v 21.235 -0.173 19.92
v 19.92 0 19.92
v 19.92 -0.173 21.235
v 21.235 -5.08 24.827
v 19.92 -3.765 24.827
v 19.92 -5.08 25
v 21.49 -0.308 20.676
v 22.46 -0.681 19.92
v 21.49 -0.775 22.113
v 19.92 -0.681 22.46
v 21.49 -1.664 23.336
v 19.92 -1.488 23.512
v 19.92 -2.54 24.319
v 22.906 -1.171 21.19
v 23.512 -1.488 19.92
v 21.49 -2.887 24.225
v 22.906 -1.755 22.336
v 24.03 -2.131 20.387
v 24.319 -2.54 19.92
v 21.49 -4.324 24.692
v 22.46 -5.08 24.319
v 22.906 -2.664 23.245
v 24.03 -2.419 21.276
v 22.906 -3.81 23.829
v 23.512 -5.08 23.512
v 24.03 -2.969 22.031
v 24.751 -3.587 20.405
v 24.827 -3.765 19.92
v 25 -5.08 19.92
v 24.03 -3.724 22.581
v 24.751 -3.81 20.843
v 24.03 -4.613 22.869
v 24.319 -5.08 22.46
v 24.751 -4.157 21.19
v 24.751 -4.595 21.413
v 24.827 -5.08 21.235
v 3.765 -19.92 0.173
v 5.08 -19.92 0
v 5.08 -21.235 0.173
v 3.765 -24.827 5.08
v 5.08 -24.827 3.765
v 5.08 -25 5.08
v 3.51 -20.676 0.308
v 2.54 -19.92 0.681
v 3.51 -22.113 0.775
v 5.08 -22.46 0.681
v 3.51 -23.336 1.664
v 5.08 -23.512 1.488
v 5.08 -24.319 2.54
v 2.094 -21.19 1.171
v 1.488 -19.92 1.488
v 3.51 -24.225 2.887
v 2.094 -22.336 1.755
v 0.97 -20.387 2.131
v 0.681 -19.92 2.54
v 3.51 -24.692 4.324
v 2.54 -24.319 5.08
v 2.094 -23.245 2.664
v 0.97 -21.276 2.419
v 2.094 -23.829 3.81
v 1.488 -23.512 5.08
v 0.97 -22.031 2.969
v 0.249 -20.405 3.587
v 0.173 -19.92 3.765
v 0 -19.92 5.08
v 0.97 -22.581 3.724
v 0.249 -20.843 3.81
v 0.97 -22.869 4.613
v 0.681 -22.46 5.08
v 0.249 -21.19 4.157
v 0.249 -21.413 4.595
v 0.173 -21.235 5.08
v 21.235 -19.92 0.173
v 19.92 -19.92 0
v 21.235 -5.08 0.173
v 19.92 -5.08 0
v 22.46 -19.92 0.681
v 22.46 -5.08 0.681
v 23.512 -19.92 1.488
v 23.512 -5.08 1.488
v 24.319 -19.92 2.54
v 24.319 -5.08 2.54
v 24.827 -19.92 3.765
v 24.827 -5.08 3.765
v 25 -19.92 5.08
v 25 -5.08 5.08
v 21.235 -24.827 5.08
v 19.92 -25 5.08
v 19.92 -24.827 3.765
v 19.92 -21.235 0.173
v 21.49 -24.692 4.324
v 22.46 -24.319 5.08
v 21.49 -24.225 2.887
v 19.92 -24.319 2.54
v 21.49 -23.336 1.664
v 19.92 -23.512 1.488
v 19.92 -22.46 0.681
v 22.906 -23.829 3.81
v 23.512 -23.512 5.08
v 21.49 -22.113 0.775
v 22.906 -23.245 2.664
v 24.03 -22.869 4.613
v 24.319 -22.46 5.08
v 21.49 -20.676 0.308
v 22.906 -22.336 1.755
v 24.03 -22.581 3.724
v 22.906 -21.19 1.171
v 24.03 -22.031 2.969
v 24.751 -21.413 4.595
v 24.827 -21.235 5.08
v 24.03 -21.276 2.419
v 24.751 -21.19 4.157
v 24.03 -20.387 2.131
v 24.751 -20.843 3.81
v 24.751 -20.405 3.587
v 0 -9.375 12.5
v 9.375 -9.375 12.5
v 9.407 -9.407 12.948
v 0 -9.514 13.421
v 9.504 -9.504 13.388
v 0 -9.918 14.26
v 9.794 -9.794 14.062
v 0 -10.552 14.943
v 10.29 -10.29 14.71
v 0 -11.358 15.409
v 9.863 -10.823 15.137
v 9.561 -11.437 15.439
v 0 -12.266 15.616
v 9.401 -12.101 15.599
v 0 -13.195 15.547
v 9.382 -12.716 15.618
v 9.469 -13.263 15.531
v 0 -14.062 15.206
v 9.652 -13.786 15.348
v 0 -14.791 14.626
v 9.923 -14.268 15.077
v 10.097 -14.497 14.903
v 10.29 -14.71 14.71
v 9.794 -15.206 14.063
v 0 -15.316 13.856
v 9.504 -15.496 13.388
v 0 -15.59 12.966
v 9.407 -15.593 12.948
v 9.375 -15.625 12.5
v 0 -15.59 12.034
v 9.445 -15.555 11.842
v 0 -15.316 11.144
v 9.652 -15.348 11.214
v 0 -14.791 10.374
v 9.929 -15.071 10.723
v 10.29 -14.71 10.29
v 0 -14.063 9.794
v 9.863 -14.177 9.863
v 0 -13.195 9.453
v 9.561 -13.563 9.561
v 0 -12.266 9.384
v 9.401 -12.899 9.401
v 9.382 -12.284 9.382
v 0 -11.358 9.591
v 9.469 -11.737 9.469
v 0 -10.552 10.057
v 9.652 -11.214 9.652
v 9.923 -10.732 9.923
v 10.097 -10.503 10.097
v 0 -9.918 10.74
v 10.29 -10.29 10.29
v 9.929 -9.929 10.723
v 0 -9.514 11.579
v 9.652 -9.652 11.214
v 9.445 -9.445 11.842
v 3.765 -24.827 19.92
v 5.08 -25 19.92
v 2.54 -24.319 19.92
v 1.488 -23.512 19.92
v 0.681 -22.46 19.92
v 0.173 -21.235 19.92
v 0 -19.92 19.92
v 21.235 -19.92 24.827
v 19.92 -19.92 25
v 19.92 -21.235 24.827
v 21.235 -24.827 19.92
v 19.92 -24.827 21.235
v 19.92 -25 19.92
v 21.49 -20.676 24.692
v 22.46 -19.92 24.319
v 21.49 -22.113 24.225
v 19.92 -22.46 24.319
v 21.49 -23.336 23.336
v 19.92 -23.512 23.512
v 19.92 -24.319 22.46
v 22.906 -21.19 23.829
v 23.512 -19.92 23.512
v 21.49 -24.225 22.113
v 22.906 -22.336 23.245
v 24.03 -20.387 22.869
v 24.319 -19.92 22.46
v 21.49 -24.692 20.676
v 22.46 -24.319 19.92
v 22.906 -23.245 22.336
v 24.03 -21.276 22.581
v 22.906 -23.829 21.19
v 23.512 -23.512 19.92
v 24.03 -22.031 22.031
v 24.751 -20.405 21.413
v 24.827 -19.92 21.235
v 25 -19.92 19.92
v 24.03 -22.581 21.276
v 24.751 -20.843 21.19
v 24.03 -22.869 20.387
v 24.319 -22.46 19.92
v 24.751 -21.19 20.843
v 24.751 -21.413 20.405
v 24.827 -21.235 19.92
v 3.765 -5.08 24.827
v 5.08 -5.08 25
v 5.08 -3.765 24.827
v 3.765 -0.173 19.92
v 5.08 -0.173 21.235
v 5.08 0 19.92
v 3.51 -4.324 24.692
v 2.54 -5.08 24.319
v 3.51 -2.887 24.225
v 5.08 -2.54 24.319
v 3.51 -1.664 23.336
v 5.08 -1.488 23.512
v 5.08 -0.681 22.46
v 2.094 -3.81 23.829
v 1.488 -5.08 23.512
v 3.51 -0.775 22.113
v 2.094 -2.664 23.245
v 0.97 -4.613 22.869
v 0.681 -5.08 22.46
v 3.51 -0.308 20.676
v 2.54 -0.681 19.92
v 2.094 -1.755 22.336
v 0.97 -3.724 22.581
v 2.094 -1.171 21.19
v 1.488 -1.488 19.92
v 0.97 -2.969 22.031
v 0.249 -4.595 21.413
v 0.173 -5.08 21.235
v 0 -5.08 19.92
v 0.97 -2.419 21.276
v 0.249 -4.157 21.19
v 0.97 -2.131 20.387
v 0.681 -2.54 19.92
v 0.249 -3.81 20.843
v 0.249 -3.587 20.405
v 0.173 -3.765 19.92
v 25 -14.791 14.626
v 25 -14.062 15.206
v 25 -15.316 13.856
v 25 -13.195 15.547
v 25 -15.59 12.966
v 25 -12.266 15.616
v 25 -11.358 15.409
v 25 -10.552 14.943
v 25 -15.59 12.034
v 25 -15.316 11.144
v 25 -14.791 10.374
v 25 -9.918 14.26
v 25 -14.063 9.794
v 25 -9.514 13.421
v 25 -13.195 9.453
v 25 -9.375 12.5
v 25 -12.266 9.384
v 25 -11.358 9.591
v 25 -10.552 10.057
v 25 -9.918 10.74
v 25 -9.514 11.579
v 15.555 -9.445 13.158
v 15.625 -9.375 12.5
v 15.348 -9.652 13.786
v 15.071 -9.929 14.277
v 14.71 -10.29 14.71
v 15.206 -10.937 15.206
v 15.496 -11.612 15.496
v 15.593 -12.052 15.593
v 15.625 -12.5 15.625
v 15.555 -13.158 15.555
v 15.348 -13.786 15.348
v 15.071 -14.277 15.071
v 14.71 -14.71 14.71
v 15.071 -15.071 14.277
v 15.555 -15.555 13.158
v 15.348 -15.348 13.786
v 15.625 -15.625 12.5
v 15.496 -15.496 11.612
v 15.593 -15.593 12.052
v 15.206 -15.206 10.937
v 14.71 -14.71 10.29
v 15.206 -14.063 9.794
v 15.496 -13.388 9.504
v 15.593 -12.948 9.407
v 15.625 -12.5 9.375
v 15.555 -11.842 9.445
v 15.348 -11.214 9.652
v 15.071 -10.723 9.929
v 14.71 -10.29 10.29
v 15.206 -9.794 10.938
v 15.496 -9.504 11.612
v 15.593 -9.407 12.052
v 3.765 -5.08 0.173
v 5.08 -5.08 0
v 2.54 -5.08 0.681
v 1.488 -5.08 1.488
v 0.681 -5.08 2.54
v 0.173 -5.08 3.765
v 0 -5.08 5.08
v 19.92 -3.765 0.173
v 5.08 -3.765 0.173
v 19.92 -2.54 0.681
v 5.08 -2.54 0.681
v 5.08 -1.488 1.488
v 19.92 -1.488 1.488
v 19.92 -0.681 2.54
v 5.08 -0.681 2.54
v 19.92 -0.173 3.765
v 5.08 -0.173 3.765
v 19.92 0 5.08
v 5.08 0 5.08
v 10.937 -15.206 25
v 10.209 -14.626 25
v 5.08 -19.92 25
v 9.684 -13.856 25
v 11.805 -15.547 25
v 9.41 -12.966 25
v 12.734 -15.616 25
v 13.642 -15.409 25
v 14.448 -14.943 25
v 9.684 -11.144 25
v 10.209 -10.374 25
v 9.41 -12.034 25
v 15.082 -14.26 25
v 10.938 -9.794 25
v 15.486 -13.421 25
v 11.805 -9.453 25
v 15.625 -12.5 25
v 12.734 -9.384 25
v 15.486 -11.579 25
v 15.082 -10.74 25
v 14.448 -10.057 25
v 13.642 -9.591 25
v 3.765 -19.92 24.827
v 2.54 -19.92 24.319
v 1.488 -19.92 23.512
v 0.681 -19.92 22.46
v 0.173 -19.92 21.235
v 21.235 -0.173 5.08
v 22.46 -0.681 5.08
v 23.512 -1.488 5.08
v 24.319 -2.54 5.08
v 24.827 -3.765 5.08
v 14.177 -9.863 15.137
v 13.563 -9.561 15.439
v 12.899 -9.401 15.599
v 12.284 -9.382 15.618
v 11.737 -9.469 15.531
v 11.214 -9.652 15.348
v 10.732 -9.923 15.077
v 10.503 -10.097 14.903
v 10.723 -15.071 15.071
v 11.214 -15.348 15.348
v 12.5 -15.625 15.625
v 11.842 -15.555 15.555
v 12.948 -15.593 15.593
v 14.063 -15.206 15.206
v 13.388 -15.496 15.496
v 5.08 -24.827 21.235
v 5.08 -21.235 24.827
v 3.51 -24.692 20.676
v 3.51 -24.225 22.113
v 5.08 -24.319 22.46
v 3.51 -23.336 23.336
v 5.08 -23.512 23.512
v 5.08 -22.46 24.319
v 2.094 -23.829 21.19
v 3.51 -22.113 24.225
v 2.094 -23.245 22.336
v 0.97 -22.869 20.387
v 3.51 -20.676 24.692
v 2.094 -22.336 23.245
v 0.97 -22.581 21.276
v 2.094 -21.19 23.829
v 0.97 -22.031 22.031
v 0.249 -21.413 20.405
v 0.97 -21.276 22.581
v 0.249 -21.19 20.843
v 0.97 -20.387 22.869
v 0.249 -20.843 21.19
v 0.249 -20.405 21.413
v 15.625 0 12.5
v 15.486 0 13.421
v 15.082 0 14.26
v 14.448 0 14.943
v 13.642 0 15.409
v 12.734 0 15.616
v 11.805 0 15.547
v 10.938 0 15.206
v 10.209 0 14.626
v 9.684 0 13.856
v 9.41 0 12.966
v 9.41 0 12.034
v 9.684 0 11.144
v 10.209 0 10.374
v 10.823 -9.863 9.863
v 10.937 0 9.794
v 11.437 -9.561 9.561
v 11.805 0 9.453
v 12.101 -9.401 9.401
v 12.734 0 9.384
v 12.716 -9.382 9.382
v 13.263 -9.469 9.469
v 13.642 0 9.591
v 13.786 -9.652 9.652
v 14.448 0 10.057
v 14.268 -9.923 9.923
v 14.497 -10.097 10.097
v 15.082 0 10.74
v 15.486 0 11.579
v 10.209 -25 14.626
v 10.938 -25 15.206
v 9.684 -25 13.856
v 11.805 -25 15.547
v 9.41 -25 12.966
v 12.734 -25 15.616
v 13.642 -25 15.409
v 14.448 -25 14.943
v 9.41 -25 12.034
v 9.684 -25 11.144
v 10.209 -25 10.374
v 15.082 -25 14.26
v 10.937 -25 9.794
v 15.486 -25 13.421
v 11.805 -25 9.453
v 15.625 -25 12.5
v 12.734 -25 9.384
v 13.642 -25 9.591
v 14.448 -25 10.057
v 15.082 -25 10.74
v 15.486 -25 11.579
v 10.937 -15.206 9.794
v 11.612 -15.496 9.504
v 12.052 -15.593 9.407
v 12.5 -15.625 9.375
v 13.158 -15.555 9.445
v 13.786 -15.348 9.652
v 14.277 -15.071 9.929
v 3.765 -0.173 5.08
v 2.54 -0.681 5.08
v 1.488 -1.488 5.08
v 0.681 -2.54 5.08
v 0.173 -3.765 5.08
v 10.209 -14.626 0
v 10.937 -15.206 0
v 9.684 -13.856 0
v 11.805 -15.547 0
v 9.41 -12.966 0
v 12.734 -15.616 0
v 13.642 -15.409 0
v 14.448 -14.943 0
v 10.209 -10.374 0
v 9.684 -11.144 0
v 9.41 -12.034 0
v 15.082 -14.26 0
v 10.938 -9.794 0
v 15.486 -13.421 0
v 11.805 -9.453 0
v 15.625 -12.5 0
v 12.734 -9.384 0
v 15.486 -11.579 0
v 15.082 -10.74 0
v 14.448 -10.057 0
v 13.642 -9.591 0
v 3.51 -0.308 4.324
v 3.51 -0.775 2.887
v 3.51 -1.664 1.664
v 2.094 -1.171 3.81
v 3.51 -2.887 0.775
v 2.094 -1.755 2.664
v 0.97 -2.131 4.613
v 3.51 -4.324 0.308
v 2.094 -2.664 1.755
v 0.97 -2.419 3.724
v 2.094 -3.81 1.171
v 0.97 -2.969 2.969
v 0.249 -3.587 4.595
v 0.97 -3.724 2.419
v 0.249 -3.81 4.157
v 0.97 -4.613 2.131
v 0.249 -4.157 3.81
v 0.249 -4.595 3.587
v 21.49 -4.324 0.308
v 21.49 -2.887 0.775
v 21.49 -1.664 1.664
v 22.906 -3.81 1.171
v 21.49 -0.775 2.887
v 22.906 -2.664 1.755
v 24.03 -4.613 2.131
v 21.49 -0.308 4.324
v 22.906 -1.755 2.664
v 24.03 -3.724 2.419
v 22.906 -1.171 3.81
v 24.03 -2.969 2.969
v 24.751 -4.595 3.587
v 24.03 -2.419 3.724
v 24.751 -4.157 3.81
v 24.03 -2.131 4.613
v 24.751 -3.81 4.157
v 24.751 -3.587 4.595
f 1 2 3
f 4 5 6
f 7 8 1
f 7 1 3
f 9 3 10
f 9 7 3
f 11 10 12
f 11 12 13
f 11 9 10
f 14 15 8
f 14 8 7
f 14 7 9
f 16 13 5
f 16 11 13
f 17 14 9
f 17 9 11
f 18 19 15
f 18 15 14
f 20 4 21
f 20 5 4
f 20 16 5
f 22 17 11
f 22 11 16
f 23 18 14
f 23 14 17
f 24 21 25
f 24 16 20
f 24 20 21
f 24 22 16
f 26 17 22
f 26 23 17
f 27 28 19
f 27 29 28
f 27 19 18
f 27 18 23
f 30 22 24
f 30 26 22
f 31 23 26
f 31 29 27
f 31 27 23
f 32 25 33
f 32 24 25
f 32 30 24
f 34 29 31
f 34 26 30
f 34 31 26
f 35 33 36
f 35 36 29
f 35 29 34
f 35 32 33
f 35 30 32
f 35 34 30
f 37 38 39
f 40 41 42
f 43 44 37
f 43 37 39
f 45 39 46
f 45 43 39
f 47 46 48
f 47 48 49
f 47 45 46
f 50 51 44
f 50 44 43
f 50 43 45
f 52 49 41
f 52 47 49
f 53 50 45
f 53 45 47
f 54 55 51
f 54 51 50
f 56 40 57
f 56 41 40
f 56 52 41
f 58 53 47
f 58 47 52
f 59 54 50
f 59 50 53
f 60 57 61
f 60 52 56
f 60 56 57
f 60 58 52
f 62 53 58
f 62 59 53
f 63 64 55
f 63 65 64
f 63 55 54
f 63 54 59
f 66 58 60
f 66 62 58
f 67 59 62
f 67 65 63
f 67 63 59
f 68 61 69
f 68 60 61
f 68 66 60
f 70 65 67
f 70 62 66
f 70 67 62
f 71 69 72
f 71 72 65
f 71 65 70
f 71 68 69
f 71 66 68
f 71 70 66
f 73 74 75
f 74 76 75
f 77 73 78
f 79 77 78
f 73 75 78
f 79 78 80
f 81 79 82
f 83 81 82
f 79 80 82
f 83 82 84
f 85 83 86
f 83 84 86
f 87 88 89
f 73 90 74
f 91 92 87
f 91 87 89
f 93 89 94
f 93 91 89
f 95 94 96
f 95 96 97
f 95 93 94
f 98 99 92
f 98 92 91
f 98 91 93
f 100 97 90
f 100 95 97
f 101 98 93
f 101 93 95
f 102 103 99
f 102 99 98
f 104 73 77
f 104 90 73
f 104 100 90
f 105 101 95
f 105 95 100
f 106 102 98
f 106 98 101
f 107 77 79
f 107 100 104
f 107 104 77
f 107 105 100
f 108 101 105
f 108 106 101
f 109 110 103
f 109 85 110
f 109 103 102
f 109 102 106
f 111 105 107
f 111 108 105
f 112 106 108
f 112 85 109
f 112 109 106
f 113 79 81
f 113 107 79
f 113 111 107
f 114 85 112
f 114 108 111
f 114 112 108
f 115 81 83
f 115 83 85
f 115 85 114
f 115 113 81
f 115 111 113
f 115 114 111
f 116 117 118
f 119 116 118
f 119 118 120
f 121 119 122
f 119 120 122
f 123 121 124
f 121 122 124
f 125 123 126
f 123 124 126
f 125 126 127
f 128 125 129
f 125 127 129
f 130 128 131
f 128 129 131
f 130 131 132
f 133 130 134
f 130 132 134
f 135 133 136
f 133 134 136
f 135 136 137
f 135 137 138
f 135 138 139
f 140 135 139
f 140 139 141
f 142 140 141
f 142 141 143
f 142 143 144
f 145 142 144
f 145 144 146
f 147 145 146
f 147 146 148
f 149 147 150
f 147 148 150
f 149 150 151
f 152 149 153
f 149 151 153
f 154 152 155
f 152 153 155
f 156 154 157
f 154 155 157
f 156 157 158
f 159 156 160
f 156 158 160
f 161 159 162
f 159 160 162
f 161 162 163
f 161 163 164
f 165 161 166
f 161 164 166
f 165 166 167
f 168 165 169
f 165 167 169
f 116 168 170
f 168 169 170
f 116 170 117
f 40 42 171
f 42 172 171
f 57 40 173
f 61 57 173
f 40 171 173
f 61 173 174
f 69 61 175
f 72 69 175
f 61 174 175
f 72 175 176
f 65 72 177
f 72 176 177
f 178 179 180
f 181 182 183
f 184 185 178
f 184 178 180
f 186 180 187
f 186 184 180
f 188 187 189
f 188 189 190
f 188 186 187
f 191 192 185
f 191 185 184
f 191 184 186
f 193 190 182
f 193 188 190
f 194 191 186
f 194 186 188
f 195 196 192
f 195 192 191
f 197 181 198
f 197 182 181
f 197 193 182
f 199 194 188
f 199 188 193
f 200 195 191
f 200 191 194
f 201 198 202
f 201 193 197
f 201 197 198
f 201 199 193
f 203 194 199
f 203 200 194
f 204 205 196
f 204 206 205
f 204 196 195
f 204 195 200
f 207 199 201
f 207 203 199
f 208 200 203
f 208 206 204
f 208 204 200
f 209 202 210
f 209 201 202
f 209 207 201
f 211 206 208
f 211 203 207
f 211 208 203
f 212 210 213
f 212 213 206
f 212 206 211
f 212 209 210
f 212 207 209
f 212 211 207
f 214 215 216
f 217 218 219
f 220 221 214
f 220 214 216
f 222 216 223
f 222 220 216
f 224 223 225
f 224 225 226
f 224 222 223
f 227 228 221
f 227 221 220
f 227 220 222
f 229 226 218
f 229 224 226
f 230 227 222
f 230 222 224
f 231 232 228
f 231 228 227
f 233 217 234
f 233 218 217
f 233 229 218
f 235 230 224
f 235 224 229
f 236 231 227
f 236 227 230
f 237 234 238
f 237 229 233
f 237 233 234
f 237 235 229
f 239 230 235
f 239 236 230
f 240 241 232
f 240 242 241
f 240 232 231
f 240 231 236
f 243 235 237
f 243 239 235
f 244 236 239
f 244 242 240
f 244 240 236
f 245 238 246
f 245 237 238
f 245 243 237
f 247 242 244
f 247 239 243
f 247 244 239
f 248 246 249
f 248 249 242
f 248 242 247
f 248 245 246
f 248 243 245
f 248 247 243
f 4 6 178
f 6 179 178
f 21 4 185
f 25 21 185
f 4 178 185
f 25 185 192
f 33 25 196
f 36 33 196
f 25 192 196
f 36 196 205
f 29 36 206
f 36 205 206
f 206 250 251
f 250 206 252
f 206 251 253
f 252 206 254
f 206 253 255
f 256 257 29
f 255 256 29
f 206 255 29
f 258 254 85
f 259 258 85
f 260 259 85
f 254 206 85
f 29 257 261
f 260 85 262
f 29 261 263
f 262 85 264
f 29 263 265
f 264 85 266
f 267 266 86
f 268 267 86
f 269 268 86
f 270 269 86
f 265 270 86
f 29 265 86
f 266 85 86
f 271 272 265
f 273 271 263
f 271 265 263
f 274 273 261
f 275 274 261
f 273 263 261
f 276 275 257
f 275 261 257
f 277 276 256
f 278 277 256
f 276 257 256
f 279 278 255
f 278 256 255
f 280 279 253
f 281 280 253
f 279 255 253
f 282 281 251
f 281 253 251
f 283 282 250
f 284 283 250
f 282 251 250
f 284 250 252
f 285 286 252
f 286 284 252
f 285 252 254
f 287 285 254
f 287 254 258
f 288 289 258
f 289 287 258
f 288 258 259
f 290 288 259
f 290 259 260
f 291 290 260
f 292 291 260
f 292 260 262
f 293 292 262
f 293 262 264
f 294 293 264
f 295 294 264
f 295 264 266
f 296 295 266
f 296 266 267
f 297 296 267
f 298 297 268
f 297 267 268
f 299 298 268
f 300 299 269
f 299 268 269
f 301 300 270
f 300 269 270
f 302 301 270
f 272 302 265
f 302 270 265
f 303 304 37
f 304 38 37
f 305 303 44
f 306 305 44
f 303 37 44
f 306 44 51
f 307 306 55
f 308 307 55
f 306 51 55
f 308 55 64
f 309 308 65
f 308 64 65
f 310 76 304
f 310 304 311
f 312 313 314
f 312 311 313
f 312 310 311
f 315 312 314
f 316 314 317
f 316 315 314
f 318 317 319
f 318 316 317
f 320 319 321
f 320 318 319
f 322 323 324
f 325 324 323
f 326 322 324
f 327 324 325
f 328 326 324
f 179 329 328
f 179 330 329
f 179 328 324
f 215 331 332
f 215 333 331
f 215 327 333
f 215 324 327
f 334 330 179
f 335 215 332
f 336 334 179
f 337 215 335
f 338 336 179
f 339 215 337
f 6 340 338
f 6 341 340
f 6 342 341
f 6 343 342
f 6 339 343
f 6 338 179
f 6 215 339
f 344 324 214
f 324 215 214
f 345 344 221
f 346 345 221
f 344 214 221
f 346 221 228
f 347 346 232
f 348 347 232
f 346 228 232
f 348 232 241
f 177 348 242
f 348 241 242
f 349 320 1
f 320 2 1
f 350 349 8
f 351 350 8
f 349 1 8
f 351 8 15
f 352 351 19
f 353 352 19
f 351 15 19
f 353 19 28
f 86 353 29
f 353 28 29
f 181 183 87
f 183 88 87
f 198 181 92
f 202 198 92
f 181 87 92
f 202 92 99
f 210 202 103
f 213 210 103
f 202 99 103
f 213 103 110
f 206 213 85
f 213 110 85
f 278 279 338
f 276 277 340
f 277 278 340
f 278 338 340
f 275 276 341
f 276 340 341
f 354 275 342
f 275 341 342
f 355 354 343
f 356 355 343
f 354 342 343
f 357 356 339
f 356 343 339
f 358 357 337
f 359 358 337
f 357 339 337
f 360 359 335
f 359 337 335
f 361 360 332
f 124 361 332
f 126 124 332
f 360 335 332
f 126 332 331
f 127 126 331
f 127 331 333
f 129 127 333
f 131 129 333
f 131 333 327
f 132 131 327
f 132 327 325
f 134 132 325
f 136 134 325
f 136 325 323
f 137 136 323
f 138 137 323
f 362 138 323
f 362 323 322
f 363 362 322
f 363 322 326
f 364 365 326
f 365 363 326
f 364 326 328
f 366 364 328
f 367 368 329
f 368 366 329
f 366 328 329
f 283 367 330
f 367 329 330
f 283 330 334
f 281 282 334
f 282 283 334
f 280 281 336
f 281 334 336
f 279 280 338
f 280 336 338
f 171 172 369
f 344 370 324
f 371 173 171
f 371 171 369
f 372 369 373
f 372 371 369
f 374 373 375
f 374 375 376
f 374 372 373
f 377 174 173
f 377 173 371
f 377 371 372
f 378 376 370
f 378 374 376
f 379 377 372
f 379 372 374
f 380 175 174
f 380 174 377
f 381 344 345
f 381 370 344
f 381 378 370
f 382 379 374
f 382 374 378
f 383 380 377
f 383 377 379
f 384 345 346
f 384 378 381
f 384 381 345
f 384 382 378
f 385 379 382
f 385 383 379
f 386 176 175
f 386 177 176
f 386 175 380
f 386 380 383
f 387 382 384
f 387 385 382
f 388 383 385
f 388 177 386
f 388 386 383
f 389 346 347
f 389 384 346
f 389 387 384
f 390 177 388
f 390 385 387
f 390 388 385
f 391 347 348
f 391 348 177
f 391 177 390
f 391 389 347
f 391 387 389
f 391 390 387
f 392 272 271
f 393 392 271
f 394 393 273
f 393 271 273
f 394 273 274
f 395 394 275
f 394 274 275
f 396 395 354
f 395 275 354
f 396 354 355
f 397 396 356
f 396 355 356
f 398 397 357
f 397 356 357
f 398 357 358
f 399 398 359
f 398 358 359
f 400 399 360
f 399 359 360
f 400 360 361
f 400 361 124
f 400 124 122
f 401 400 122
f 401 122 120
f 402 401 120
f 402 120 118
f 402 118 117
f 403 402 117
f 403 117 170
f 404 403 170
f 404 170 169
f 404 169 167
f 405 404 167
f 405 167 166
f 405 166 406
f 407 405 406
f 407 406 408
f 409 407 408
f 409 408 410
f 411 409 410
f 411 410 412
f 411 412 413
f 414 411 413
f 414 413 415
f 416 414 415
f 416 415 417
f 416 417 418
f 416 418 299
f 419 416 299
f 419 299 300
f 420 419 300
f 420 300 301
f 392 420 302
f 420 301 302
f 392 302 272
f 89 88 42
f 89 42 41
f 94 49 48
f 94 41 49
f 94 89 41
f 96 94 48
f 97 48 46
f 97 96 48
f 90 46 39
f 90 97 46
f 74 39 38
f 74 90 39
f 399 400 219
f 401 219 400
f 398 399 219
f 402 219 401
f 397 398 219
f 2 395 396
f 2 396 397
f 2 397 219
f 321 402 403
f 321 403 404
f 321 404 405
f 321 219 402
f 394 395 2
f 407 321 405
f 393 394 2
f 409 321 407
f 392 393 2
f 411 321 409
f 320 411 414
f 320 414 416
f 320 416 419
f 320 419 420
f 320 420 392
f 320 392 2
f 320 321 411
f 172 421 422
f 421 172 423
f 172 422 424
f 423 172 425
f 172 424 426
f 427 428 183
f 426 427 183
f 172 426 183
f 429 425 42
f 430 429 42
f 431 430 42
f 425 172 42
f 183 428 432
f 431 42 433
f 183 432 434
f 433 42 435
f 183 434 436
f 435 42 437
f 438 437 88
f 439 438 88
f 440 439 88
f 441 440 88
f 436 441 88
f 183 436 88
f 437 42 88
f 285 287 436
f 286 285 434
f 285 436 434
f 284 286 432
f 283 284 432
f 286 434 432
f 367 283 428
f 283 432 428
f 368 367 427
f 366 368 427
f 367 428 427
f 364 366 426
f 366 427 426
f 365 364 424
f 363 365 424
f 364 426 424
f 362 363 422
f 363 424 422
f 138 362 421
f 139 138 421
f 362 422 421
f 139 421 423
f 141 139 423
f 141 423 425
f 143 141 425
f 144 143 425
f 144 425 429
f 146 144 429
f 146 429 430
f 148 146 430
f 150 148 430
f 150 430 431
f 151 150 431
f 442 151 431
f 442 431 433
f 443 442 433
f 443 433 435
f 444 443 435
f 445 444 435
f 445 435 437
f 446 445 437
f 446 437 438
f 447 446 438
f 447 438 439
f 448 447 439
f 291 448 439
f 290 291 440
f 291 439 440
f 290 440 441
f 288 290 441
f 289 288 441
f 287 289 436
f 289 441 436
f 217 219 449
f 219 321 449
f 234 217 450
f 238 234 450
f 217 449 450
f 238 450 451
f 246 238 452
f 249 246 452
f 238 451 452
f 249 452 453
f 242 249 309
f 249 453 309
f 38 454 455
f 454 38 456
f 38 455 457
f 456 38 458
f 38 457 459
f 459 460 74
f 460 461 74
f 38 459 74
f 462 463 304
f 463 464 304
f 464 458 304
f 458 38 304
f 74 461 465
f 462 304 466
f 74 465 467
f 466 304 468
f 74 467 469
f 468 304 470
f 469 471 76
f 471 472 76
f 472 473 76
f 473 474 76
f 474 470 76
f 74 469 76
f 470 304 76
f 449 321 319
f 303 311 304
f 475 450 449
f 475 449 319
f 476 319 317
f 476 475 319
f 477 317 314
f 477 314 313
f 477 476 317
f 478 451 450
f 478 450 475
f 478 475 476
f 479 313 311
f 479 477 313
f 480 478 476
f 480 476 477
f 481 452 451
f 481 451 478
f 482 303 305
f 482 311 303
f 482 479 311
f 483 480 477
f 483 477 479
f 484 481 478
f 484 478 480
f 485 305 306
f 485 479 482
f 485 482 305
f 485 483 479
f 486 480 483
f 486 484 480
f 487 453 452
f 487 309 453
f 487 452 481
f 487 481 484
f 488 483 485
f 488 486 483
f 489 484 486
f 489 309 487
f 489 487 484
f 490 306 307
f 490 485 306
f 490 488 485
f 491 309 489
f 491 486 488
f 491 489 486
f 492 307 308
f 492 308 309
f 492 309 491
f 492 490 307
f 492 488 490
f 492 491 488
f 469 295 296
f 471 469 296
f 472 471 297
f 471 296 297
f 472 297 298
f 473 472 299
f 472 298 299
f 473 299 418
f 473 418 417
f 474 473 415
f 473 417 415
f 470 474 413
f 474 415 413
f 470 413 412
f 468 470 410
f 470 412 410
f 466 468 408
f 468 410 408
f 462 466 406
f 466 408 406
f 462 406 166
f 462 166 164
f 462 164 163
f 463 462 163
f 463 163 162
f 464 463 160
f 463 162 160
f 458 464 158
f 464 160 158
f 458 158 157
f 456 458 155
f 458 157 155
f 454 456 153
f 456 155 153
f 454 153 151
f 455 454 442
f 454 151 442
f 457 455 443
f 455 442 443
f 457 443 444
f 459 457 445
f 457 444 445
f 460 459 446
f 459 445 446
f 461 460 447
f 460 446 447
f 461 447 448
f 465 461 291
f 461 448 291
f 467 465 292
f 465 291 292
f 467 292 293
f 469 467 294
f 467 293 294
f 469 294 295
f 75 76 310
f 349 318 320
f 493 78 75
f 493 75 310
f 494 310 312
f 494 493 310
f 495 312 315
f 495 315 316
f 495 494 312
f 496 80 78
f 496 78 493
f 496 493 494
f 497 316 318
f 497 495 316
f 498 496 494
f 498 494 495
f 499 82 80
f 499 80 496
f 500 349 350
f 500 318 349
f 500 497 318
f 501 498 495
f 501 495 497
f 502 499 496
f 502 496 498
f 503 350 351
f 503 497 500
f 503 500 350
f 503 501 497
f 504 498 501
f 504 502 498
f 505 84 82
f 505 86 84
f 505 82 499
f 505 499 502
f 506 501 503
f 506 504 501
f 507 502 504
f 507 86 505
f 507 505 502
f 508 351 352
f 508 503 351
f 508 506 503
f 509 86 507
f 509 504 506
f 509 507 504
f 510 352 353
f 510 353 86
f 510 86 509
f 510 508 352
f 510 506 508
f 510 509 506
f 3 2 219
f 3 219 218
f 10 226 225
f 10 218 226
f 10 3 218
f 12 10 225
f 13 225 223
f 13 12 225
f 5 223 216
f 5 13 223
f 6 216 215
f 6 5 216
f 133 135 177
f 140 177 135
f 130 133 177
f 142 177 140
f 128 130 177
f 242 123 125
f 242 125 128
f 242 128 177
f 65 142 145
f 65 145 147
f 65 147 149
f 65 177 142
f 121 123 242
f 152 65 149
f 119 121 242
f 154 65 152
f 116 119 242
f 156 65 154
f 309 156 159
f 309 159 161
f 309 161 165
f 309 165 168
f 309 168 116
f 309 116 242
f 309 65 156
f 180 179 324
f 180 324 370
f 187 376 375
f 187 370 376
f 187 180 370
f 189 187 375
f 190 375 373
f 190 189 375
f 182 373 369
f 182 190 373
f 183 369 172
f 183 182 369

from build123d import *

# Parameters (mm, degrees)
F0_W     = 25
F0_H     = 25
F1_DEPTH = 25
F2_R     = 3.125
F3_DEPTH = 25.4
F4_R     = 3.125
F5_DEPTH = 25.4
F6_R     = 3.125
F7_DEPTH = 25.4
F8_R     = 5.08
F9_R     = 5.08
F10_R    = 5.08
F11_R    = 5.08
F12_R    = 5.08
F13_R    = 5.08


with BuildPart() as f1:
    # F0 (on Top) → F1 (new body)
    with BuildSketch(Plane.XY):
        with Locations((12.5, -12.5)):
            Rectangle(F0_W, F0_H)
    extrude(amount=F1_DEPTH)

    # F2 (on face) → F3 (cut)
    with BuildSketch(Plane.XZ.offset(25)):
        with Locations((12.5, 12.5)):
            Circle(F2_R)
    extrude(amount=-F3_DEPTH, mode=Mode.SUBTRACT)

    # F4 (on face) → F5 (cut)
    with BuildSketch(Plane.YZ.offset(25)):
        with Locations((-12.5, 12.5)):
            Circle(F4_R)
    extrude(amount=-F5_DEPTH, mode=Mode.SUBTRACT)

    # F6 (on face) → F7 (cut)
    with BuildSketch(Plane.XY.offset(25)):
        with Locations((12.5, -12.5)):
            Circle(F6_R)
    extrude(amount=-F7_DEPTH, mode=Mode.SUBTRACT)

    # F8
    f8_edges = [f1.edges().sort_by_distance(p)[0] for p in [
        (12.5, -25, 0),
    ]]
    fillet(f8_edges, radius=F8_R)

    # F9
    f9_edges = [f1.edges().sort_by_distance(p)[0] for p in [
        (12.5, 0, 0),
    ]]
    fillet(f9_edges, radius=F9_R)

    # F10
    f10_edges = [f1.edges().sort_by_distance(p)[0] for p in [
        (12.5, 0, 25),
    ]]
    fillet(f10_edges, radius=F10_R)

    # F11
    f11_edges = [f1.edges().sort_by_distance(p)[0] for p in [
        (12.5, -25, 25),
    ]]
    fillet(f11_edges, radius=F11_R)

    # F12
    f12_edges = [f1.edges().sort_by_distance(p)[0] for p in [
        (25, 0, 12.5),
    ]]
    fillet(f12_edges, radius=F12_R)

    # F13
    f13_edges = [f1.edges().sort_by_distance(p)[0] for p in [
        (0, -12.5, 25),
    ]]
    fillet(f13_edges, radius=F13_R)


solid = f1.part
